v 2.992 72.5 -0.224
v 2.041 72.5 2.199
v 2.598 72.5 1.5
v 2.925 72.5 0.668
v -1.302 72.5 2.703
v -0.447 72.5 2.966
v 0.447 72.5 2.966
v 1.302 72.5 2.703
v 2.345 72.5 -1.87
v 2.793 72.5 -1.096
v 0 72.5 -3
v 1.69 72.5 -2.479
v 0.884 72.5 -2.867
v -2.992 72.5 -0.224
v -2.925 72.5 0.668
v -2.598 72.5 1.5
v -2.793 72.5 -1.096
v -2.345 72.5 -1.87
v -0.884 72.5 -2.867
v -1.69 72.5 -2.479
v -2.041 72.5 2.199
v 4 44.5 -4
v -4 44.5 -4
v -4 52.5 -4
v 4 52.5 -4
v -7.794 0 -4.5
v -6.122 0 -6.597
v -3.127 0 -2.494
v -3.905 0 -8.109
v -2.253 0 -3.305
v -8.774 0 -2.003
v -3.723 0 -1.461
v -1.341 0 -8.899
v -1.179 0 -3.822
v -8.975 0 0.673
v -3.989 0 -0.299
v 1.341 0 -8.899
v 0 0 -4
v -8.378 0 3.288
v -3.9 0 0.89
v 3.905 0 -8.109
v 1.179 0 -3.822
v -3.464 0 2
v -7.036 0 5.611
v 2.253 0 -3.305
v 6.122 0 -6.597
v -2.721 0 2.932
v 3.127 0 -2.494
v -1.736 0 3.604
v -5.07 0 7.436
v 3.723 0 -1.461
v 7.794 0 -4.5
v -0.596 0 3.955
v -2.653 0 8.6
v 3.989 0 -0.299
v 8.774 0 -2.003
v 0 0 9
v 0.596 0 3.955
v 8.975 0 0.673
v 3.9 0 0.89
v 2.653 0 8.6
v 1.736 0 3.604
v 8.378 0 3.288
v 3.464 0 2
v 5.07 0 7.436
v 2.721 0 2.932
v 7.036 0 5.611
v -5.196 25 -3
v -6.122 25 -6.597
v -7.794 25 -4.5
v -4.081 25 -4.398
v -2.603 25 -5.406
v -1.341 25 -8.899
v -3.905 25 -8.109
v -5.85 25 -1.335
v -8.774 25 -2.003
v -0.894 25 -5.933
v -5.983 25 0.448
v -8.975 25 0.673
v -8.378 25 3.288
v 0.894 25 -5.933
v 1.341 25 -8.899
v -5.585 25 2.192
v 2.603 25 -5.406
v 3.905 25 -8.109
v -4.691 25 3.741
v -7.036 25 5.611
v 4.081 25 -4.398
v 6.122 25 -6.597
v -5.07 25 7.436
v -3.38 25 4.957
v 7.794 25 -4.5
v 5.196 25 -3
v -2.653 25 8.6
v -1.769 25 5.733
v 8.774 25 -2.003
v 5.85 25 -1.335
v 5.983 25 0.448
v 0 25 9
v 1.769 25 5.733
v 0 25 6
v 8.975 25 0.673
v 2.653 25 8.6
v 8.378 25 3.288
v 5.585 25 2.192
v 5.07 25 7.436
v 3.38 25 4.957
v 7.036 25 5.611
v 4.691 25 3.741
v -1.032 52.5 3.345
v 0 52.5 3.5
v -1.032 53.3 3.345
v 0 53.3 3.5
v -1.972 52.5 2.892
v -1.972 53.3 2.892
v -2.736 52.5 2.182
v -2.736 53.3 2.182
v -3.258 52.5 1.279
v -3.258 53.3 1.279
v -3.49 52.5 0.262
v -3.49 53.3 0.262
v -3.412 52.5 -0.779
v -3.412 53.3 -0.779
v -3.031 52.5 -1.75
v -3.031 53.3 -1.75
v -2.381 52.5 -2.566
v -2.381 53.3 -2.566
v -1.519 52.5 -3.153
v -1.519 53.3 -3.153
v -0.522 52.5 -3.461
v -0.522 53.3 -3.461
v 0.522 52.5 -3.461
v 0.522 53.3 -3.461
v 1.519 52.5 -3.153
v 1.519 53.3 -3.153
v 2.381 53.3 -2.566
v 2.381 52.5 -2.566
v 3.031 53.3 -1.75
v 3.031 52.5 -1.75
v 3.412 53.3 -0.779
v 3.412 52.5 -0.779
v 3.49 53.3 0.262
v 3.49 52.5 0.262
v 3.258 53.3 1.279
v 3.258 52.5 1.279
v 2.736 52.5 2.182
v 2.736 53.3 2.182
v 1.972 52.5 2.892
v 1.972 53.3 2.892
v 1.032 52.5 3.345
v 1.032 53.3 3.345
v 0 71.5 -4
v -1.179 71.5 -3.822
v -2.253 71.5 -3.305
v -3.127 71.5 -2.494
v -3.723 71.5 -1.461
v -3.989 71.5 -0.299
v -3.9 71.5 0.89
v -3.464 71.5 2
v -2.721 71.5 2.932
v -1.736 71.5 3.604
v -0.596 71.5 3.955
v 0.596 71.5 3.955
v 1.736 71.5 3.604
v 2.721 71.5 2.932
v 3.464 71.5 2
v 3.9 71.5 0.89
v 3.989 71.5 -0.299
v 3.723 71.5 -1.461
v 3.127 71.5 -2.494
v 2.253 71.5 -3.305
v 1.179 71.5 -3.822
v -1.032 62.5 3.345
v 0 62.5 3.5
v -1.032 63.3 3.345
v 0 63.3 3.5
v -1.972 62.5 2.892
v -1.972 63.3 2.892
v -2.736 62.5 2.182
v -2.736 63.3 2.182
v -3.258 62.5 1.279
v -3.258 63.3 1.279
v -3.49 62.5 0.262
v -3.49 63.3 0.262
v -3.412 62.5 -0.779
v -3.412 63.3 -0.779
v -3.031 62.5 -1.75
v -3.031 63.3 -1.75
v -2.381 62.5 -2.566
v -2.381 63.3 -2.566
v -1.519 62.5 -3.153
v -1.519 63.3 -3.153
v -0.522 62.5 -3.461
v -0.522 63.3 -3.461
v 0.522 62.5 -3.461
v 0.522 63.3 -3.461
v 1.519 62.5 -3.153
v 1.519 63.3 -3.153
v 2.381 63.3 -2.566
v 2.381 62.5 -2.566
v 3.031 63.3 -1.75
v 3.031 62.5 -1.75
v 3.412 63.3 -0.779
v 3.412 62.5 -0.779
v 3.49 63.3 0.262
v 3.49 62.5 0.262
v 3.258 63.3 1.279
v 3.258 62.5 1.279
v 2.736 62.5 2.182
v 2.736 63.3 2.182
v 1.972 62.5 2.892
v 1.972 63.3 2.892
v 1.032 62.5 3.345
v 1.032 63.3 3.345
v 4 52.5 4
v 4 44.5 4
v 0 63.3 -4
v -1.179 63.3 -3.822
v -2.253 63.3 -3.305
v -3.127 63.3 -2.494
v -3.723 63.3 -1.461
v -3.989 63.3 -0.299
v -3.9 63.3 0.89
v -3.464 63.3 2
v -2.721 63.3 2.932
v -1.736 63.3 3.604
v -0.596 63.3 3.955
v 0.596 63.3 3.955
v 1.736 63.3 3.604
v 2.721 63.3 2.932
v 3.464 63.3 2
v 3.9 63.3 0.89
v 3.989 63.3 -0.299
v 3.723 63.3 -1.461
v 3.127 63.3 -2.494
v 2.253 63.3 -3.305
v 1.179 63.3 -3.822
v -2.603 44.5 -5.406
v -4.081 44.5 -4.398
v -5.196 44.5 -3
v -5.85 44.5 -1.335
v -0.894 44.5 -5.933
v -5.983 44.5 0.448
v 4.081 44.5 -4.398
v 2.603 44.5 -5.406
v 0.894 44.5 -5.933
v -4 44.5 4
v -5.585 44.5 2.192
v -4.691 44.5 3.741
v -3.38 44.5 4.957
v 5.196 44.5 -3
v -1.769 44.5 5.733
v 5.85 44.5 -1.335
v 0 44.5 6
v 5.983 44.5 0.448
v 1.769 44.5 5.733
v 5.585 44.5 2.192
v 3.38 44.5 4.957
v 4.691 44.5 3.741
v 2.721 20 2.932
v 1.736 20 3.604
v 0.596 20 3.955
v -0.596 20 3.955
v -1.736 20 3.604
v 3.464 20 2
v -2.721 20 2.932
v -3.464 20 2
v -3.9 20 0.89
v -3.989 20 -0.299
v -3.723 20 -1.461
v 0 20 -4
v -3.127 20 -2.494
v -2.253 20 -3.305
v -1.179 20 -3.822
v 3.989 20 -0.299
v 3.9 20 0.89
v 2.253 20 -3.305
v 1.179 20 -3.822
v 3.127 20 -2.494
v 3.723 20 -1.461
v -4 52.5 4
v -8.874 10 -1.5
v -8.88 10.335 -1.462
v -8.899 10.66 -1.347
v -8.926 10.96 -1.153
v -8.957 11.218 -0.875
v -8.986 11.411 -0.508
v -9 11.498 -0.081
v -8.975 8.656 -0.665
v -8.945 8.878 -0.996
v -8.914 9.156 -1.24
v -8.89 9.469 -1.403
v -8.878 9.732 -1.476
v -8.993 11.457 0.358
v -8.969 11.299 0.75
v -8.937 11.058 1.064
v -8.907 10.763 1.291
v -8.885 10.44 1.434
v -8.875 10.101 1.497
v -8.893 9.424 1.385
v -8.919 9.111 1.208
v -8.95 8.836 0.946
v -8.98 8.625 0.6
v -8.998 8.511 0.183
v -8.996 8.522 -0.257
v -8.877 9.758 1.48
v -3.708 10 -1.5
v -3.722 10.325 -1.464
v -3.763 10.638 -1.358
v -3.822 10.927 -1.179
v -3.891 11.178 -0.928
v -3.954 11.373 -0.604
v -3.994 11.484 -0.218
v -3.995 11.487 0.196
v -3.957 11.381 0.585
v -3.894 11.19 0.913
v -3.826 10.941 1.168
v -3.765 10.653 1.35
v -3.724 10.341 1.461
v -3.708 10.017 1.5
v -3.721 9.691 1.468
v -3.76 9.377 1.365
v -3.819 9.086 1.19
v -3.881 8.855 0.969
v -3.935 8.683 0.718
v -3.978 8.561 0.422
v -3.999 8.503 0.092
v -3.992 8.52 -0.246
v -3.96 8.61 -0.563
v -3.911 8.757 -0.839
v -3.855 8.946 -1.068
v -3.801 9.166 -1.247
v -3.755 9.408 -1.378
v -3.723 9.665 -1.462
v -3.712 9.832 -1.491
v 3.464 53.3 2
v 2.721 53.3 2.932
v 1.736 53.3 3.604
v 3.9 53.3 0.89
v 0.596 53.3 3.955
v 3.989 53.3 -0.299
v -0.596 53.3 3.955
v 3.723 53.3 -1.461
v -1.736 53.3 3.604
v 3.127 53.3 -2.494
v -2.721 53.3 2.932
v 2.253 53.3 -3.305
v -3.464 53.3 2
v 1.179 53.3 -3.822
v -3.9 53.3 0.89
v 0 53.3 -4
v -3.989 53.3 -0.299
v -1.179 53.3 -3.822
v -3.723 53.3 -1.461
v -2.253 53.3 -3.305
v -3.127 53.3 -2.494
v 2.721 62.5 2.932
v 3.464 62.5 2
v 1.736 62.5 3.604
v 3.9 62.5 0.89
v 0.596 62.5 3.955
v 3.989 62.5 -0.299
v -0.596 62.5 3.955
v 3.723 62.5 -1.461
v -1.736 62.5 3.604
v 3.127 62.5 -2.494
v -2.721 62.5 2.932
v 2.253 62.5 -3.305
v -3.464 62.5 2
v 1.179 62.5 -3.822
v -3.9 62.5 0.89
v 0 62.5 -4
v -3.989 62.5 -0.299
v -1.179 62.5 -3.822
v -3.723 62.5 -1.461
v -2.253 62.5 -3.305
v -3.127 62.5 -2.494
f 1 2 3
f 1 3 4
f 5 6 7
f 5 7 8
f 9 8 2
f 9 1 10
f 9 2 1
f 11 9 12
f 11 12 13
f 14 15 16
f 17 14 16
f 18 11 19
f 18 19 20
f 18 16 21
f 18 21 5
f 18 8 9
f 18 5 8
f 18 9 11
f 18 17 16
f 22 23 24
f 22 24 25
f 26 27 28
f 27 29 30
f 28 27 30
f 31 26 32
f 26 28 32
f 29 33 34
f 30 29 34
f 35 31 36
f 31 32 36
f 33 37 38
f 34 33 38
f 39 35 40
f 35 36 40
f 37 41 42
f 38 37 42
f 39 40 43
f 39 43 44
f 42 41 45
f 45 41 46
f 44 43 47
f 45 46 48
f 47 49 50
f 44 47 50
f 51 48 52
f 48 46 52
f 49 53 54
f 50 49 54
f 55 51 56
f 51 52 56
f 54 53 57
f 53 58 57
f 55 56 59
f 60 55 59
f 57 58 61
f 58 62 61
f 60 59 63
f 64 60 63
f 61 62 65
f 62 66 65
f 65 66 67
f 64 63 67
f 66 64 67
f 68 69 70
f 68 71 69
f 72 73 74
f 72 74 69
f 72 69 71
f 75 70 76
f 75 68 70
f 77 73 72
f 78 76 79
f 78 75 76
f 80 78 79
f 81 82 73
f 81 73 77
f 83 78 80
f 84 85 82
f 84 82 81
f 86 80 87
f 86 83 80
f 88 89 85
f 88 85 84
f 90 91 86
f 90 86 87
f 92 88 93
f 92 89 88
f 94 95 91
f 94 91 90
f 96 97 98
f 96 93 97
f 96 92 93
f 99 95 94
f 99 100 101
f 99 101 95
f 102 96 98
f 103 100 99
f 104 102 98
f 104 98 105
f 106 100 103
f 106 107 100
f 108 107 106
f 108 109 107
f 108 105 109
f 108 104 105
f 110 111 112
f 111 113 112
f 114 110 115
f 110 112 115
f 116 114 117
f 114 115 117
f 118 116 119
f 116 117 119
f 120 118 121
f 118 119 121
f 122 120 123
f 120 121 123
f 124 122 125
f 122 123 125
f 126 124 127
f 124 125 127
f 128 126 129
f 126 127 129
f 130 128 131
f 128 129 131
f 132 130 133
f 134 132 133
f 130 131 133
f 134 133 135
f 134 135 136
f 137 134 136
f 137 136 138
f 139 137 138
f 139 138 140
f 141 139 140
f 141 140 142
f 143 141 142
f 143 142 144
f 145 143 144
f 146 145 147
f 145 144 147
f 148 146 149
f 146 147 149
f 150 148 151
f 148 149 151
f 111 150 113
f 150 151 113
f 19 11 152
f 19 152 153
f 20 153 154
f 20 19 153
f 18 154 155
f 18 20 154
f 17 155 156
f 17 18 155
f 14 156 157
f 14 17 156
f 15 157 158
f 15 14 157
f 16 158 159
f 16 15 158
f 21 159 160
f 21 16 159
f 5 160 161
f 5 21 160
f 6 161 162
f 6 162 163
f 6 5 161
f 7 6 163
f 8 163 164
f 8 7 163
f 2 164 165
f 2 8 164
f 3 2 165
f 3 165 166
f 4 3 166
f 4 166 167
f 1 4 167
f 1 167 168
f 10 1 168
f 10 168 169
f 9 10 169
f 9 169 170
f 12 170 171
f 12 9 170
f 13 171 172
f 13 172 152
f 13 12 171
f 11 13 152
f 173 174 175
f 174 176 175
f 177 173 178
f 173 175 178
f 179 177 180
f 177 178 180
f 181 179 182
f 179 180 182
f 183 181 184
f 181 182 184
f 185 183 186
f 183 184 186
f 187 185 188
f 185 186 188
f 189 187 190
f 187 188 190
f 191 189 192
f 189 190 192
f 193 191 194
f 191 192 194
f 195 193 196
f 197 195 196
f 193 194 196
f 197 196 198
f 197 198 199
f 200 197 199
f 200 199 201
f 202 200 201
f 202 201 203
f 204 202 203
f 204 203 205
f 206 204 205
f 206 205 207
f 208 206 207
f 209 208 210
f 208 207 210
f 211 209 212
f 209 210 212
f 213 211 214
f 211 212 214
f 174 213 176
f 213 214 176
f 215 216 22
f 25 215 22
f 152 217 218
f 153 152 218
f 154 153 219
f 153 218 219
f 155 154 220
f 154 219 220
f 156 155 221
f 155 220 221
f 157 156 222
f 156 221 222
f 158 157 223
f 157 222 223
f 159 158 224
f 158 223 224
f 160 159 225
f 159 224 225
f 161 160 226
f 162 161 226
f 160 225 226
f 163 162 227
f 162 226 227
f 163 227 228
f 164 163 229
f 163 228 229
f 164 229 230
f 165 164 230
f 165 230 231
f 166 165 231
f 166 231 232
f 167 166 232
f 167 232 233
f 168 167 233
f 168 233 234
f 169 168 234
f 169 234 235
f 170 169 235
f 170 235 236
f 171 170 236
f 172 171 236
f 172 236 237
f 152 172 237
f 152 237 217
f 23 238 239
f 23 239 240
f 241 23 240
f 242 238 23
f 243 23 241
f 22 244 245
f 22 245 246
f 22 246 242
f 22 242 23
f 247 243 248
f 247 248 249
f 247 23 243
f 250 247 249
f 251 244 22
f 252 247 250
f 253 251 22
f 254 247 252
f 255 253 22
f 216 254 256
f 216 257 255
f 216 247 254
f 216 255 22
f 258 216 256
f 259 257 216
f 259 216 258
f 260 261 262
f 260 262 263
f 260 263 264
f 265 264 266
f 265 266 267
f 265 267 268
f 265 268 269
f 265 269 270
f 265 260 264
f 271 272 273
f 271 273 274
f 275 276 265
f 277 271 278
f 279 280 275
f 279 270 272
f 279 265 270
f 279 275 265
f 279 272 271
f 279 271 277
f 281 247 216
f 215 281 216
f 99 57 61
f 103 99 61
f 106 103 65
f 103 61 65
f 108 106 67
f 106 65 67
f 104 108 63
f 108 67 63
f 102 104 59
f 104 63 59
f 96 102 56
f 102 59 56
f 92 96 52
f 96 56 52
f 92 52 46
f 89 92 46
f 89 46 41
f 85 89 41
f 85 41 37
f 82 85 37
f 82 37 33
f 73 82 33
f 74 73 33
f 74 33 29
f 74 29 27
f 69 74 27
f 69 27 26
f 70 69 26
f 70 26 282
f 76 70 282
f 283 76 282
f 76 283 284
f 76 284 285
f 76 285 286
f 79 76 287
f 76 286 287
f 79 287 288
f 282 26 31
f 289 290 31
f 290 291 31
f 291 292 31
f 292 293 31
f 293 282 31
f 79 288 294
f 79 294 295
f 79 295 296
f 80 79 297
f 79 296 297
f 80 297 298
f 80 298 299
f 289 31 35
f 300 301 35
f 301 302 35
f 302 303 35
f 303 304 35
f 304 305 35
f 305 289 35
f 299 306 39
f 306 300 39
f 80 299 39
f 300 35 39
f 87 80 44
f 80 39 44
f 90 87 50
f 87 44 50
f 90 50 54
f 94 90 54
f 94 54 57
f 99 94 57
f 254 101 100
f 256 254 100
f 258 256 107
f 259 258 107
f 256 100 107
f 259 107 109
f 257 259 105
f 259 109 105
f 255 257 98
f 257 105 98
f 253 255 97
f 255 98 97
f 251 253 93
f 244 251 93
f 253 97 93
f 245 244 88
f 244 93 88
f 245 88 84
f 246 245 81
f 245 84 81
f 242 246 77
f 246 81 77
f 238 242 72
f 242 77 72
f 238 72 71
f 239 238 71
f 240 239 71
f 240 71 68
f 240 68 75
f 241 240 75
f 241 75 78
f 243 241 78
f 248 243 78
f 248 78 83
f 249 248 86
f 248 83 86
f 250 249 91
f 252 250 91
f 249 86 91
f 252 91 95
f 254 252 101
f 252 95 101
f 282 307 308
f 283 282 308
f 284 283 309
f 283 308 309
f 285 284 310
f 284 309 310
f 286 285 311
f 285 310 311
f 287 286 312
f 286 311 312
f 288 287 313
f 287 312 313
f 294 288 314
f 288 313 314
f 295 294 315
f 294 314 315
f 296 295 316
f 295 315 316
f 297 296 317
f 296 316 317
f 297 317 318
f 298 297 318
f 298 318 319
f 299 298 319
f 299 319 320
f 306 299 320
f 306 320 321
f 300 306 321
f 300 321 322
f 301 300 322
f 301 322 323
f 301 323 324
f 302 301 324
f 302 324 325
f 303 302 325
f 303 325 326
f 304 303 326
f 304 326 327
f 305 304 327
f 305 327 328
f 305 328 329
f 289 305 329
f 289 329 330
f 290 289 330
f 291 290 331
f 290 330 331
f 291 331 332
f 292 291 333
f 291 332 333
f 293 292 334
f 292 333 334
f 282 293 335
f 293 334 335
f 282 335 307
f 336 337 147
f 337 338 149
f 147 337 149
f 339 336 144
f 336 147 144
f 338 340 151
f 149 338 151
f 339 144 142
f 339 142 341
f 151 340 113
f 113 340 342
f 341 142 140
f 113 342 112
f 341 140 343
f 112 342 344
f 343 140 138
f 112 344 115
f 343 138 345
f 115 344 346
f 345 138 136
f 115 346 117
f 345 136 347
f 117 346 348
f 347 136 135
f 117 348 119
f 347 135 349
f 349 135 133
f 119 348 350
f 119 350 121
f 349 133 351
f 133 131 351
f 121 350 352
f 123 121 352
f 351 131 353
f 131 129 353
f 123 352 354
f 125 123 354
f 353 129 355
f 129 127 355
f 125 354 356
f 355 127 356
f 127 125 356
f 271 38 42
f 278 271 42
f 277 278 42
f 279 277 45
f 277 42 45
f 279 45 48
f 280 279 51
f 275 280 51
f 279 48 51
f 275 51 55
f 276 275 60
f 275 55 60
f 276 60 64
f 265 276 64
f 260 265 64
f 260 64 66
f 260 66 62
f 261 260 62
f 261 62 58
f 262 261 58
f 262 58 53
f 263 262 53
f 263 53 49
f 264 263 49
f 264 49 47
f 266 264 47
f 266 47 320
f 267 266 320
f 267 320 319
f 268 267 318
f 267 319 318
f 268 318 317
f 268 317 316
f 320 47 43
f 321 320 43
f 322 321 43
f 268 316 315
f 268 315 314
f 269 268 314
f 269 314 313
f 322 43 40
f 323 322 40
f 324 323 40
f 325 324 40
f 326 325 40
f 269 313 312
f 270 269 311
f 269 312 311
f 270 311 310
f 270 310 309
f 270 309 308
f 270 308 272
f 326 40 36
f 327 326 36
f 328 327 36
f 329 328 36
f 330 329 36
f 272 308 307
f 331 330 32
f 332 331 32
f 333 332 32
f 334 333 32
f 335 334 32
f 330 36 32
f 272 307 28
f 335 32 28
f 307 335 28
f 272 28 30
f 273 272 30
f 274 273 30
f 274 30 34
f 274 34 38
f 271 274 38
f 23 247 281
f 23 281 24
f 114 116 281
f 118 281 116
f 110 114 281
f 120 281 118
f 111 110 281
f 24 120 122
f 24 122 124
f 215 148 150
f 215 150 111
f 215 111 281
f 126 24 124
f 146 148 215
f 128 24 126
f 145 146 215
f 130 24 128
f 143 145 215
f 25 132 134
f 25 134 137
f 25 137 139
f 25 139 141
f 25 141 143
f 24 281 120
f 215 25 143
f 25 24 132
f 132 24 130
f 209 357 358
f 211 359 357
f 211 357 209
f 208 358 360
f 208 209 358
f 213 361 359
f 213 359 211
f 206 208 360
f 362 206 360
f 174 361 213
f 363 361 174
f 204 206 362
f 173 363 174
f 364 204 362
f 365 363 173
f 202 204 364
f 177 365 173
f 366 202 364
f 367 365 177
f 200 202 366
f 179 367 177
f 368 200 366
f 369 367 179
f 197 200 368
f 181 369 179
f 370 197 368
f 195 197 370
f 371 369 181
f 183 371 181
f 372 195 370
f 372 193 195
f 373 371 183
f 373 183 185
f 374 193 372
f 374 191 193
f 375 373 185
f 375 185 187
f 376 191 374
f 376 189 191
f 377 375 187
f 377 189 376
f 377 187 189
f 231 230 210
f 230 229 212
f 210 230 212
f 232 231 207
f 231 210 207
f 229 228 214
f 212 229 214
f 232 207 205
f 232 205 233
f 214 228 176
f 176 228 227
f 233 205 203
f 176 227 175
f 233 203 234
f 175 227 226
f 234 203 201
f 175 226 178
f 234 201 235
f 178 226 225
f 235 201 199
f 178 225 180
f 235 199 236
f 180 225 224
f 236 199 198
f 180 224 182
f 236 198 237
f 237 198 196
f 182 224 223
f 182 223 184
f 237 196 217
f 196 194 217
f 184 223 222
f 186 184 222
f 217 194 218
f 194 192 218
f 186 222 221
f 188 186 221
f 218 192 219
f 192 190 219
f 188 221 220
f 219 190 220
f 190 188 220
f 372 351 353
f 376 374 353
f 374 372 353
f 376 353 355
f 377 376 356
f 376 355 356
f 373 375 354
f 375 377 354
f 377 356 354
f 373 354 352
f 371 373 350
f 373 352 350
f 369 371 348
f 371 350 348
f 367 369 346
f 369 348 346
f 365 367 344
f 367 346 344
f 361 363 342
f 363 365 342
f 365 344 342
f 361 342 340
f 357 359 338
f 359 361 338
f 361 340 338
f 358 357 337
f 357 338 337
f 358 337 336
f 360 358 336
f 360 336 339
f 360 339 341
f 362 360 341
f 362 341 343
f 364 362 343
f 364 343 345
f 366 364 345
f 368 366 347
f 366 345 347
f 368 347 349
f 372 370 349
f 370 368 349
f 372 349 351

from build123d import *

# Parameters (mm, degrees)
SKETCH_1_R          = 9
EXTRUDE_1_DEPTH     = 25
SKETCH_2_R          = 4
CUT_EXTRUDE_1_DEPTH = 20
SKETCH_6_R          = 6
EXTRUDE_4_DEPTH     = 19.5
SKETCH_3_W          = 8
SKETCH_3_H          = 8
EXTRUDE_2_DEPTH     = 8
SKETCH_4_R          = 4
EXTRUDE_3_DEPTH     = 20
SKETCH_5_R          = 1.5
CUT_EXTRUDE_2_DEPTH = 74.608763065
CHAMFER_1_SIZE      = 1
SKETCH_7_W          = 0.5
SKETCH_7_H          = 0.8


with BuildPart() as part:
    # 草图1 → 凸台-拉伸1 (new body)
    with BuildSketch(Plane(origin=(0, 0, 0), x_dir=(1, 0, 0), z_dir=(0, 1, 0))):
        with Locations(Location((0, 0, 0), (0, 0, 270))):
            Circle(SKETCH_1_R)
    extrude(amount=EXTRUDE_1_DEPTH)

    # 草图2 → 切除-拉伸1 (cut)
    with BuildSketch(Plane.XZ):
        with Locations(Location((0, 0, 0), (0, 0, 270))):
            Circle(SKETCH_2_R)
    extrude(amount=-CUT_EXTRUDE_1_DEPTH, mode=Mode.SUBTRACT)

    # 草图6 → 凸台-拉伸4 (add)
    with BuildSketch(Plane(origin=(0, 25, 0), x_dir=(1, 0, 0), z_dir=(0, 1, 0))):
        with Locations(Location((0, 0, 0), (0, 0, 270))):
            Circle(SKETCH_6_R)
    extrude(amount=EXTRUDE_4_DEPTH)

    # 草图3 → 凸台-拉伸2 (add)
    with BuildSketch(Plane(origin=(0, 44.5, 0), x_dir=(1, 0, 0), z_dir=(0, 1, 0))):
        Rectangle(SKETCH_3_W, SKETCH_3_H)
    extrude(amount=EXTRUDE_2_DEPTH)

    # 草图4 → 凸台-拉伸3 (add)
    with BuildSketch(Plane(origin=(0, 52.5, 0), x_dir=(1, 0, 0), z_dir=(0, 1, 0))):
        with Locations(Location((0, 0, 0), (0, 0, 90))):
            Circle(SKETCH_4_R)
    extrude(amount=EXTRUDE_3_DEPTH)

    # 草图5 → 切除-拉伸2 (cut, through all)
    with BuildSketch(Plane(origin=(0, 0, 0), x_dir=(0, 0, -1), z_dir=(1, 0, 0))):
        with Locations((0, 10)):
            Circle(SKETCH_5_R)
    extrude(amount=-CUT_EXTRUDE_2_DEPTH, mode=Mode.SUBTRACT)

    # 倒角1
    chamfer_1_edges = [part.edges().sort_by_distance(p)[0] for p in [
        (0, 72.5, 4),
    ]]
    chamfer(chamfer_1_edges, length=CHAMFER_1_SIZE)

    # 草图7 → 切除-旋转1 (revolve, cut)
    with BuildSketch(Plane(origin=(0, 0, 0), x_dir=(0, 0, -1), z_dir=(1, 0, 0)), mode=Mode.PRIVATE) as cut_revolve_1_sk:
        with Locations((3.75, 62.9)):
            Rectangle(SKETCH_7_W, SKETCH_7_H)
        with Locations((3.75, 52.9)):
            Rectangle(SKETCH_7_W, SKETCH_7_H)
    revolve(cut_revolve_1_sk.sketch.rotate(Axis((0, 72.5, 0), (0, -1, 0)), 180), axis=Axis((0, 72.5, 0), (0, -1, 0)), mode=Mode.SUBTRACT)


solid = part.part
